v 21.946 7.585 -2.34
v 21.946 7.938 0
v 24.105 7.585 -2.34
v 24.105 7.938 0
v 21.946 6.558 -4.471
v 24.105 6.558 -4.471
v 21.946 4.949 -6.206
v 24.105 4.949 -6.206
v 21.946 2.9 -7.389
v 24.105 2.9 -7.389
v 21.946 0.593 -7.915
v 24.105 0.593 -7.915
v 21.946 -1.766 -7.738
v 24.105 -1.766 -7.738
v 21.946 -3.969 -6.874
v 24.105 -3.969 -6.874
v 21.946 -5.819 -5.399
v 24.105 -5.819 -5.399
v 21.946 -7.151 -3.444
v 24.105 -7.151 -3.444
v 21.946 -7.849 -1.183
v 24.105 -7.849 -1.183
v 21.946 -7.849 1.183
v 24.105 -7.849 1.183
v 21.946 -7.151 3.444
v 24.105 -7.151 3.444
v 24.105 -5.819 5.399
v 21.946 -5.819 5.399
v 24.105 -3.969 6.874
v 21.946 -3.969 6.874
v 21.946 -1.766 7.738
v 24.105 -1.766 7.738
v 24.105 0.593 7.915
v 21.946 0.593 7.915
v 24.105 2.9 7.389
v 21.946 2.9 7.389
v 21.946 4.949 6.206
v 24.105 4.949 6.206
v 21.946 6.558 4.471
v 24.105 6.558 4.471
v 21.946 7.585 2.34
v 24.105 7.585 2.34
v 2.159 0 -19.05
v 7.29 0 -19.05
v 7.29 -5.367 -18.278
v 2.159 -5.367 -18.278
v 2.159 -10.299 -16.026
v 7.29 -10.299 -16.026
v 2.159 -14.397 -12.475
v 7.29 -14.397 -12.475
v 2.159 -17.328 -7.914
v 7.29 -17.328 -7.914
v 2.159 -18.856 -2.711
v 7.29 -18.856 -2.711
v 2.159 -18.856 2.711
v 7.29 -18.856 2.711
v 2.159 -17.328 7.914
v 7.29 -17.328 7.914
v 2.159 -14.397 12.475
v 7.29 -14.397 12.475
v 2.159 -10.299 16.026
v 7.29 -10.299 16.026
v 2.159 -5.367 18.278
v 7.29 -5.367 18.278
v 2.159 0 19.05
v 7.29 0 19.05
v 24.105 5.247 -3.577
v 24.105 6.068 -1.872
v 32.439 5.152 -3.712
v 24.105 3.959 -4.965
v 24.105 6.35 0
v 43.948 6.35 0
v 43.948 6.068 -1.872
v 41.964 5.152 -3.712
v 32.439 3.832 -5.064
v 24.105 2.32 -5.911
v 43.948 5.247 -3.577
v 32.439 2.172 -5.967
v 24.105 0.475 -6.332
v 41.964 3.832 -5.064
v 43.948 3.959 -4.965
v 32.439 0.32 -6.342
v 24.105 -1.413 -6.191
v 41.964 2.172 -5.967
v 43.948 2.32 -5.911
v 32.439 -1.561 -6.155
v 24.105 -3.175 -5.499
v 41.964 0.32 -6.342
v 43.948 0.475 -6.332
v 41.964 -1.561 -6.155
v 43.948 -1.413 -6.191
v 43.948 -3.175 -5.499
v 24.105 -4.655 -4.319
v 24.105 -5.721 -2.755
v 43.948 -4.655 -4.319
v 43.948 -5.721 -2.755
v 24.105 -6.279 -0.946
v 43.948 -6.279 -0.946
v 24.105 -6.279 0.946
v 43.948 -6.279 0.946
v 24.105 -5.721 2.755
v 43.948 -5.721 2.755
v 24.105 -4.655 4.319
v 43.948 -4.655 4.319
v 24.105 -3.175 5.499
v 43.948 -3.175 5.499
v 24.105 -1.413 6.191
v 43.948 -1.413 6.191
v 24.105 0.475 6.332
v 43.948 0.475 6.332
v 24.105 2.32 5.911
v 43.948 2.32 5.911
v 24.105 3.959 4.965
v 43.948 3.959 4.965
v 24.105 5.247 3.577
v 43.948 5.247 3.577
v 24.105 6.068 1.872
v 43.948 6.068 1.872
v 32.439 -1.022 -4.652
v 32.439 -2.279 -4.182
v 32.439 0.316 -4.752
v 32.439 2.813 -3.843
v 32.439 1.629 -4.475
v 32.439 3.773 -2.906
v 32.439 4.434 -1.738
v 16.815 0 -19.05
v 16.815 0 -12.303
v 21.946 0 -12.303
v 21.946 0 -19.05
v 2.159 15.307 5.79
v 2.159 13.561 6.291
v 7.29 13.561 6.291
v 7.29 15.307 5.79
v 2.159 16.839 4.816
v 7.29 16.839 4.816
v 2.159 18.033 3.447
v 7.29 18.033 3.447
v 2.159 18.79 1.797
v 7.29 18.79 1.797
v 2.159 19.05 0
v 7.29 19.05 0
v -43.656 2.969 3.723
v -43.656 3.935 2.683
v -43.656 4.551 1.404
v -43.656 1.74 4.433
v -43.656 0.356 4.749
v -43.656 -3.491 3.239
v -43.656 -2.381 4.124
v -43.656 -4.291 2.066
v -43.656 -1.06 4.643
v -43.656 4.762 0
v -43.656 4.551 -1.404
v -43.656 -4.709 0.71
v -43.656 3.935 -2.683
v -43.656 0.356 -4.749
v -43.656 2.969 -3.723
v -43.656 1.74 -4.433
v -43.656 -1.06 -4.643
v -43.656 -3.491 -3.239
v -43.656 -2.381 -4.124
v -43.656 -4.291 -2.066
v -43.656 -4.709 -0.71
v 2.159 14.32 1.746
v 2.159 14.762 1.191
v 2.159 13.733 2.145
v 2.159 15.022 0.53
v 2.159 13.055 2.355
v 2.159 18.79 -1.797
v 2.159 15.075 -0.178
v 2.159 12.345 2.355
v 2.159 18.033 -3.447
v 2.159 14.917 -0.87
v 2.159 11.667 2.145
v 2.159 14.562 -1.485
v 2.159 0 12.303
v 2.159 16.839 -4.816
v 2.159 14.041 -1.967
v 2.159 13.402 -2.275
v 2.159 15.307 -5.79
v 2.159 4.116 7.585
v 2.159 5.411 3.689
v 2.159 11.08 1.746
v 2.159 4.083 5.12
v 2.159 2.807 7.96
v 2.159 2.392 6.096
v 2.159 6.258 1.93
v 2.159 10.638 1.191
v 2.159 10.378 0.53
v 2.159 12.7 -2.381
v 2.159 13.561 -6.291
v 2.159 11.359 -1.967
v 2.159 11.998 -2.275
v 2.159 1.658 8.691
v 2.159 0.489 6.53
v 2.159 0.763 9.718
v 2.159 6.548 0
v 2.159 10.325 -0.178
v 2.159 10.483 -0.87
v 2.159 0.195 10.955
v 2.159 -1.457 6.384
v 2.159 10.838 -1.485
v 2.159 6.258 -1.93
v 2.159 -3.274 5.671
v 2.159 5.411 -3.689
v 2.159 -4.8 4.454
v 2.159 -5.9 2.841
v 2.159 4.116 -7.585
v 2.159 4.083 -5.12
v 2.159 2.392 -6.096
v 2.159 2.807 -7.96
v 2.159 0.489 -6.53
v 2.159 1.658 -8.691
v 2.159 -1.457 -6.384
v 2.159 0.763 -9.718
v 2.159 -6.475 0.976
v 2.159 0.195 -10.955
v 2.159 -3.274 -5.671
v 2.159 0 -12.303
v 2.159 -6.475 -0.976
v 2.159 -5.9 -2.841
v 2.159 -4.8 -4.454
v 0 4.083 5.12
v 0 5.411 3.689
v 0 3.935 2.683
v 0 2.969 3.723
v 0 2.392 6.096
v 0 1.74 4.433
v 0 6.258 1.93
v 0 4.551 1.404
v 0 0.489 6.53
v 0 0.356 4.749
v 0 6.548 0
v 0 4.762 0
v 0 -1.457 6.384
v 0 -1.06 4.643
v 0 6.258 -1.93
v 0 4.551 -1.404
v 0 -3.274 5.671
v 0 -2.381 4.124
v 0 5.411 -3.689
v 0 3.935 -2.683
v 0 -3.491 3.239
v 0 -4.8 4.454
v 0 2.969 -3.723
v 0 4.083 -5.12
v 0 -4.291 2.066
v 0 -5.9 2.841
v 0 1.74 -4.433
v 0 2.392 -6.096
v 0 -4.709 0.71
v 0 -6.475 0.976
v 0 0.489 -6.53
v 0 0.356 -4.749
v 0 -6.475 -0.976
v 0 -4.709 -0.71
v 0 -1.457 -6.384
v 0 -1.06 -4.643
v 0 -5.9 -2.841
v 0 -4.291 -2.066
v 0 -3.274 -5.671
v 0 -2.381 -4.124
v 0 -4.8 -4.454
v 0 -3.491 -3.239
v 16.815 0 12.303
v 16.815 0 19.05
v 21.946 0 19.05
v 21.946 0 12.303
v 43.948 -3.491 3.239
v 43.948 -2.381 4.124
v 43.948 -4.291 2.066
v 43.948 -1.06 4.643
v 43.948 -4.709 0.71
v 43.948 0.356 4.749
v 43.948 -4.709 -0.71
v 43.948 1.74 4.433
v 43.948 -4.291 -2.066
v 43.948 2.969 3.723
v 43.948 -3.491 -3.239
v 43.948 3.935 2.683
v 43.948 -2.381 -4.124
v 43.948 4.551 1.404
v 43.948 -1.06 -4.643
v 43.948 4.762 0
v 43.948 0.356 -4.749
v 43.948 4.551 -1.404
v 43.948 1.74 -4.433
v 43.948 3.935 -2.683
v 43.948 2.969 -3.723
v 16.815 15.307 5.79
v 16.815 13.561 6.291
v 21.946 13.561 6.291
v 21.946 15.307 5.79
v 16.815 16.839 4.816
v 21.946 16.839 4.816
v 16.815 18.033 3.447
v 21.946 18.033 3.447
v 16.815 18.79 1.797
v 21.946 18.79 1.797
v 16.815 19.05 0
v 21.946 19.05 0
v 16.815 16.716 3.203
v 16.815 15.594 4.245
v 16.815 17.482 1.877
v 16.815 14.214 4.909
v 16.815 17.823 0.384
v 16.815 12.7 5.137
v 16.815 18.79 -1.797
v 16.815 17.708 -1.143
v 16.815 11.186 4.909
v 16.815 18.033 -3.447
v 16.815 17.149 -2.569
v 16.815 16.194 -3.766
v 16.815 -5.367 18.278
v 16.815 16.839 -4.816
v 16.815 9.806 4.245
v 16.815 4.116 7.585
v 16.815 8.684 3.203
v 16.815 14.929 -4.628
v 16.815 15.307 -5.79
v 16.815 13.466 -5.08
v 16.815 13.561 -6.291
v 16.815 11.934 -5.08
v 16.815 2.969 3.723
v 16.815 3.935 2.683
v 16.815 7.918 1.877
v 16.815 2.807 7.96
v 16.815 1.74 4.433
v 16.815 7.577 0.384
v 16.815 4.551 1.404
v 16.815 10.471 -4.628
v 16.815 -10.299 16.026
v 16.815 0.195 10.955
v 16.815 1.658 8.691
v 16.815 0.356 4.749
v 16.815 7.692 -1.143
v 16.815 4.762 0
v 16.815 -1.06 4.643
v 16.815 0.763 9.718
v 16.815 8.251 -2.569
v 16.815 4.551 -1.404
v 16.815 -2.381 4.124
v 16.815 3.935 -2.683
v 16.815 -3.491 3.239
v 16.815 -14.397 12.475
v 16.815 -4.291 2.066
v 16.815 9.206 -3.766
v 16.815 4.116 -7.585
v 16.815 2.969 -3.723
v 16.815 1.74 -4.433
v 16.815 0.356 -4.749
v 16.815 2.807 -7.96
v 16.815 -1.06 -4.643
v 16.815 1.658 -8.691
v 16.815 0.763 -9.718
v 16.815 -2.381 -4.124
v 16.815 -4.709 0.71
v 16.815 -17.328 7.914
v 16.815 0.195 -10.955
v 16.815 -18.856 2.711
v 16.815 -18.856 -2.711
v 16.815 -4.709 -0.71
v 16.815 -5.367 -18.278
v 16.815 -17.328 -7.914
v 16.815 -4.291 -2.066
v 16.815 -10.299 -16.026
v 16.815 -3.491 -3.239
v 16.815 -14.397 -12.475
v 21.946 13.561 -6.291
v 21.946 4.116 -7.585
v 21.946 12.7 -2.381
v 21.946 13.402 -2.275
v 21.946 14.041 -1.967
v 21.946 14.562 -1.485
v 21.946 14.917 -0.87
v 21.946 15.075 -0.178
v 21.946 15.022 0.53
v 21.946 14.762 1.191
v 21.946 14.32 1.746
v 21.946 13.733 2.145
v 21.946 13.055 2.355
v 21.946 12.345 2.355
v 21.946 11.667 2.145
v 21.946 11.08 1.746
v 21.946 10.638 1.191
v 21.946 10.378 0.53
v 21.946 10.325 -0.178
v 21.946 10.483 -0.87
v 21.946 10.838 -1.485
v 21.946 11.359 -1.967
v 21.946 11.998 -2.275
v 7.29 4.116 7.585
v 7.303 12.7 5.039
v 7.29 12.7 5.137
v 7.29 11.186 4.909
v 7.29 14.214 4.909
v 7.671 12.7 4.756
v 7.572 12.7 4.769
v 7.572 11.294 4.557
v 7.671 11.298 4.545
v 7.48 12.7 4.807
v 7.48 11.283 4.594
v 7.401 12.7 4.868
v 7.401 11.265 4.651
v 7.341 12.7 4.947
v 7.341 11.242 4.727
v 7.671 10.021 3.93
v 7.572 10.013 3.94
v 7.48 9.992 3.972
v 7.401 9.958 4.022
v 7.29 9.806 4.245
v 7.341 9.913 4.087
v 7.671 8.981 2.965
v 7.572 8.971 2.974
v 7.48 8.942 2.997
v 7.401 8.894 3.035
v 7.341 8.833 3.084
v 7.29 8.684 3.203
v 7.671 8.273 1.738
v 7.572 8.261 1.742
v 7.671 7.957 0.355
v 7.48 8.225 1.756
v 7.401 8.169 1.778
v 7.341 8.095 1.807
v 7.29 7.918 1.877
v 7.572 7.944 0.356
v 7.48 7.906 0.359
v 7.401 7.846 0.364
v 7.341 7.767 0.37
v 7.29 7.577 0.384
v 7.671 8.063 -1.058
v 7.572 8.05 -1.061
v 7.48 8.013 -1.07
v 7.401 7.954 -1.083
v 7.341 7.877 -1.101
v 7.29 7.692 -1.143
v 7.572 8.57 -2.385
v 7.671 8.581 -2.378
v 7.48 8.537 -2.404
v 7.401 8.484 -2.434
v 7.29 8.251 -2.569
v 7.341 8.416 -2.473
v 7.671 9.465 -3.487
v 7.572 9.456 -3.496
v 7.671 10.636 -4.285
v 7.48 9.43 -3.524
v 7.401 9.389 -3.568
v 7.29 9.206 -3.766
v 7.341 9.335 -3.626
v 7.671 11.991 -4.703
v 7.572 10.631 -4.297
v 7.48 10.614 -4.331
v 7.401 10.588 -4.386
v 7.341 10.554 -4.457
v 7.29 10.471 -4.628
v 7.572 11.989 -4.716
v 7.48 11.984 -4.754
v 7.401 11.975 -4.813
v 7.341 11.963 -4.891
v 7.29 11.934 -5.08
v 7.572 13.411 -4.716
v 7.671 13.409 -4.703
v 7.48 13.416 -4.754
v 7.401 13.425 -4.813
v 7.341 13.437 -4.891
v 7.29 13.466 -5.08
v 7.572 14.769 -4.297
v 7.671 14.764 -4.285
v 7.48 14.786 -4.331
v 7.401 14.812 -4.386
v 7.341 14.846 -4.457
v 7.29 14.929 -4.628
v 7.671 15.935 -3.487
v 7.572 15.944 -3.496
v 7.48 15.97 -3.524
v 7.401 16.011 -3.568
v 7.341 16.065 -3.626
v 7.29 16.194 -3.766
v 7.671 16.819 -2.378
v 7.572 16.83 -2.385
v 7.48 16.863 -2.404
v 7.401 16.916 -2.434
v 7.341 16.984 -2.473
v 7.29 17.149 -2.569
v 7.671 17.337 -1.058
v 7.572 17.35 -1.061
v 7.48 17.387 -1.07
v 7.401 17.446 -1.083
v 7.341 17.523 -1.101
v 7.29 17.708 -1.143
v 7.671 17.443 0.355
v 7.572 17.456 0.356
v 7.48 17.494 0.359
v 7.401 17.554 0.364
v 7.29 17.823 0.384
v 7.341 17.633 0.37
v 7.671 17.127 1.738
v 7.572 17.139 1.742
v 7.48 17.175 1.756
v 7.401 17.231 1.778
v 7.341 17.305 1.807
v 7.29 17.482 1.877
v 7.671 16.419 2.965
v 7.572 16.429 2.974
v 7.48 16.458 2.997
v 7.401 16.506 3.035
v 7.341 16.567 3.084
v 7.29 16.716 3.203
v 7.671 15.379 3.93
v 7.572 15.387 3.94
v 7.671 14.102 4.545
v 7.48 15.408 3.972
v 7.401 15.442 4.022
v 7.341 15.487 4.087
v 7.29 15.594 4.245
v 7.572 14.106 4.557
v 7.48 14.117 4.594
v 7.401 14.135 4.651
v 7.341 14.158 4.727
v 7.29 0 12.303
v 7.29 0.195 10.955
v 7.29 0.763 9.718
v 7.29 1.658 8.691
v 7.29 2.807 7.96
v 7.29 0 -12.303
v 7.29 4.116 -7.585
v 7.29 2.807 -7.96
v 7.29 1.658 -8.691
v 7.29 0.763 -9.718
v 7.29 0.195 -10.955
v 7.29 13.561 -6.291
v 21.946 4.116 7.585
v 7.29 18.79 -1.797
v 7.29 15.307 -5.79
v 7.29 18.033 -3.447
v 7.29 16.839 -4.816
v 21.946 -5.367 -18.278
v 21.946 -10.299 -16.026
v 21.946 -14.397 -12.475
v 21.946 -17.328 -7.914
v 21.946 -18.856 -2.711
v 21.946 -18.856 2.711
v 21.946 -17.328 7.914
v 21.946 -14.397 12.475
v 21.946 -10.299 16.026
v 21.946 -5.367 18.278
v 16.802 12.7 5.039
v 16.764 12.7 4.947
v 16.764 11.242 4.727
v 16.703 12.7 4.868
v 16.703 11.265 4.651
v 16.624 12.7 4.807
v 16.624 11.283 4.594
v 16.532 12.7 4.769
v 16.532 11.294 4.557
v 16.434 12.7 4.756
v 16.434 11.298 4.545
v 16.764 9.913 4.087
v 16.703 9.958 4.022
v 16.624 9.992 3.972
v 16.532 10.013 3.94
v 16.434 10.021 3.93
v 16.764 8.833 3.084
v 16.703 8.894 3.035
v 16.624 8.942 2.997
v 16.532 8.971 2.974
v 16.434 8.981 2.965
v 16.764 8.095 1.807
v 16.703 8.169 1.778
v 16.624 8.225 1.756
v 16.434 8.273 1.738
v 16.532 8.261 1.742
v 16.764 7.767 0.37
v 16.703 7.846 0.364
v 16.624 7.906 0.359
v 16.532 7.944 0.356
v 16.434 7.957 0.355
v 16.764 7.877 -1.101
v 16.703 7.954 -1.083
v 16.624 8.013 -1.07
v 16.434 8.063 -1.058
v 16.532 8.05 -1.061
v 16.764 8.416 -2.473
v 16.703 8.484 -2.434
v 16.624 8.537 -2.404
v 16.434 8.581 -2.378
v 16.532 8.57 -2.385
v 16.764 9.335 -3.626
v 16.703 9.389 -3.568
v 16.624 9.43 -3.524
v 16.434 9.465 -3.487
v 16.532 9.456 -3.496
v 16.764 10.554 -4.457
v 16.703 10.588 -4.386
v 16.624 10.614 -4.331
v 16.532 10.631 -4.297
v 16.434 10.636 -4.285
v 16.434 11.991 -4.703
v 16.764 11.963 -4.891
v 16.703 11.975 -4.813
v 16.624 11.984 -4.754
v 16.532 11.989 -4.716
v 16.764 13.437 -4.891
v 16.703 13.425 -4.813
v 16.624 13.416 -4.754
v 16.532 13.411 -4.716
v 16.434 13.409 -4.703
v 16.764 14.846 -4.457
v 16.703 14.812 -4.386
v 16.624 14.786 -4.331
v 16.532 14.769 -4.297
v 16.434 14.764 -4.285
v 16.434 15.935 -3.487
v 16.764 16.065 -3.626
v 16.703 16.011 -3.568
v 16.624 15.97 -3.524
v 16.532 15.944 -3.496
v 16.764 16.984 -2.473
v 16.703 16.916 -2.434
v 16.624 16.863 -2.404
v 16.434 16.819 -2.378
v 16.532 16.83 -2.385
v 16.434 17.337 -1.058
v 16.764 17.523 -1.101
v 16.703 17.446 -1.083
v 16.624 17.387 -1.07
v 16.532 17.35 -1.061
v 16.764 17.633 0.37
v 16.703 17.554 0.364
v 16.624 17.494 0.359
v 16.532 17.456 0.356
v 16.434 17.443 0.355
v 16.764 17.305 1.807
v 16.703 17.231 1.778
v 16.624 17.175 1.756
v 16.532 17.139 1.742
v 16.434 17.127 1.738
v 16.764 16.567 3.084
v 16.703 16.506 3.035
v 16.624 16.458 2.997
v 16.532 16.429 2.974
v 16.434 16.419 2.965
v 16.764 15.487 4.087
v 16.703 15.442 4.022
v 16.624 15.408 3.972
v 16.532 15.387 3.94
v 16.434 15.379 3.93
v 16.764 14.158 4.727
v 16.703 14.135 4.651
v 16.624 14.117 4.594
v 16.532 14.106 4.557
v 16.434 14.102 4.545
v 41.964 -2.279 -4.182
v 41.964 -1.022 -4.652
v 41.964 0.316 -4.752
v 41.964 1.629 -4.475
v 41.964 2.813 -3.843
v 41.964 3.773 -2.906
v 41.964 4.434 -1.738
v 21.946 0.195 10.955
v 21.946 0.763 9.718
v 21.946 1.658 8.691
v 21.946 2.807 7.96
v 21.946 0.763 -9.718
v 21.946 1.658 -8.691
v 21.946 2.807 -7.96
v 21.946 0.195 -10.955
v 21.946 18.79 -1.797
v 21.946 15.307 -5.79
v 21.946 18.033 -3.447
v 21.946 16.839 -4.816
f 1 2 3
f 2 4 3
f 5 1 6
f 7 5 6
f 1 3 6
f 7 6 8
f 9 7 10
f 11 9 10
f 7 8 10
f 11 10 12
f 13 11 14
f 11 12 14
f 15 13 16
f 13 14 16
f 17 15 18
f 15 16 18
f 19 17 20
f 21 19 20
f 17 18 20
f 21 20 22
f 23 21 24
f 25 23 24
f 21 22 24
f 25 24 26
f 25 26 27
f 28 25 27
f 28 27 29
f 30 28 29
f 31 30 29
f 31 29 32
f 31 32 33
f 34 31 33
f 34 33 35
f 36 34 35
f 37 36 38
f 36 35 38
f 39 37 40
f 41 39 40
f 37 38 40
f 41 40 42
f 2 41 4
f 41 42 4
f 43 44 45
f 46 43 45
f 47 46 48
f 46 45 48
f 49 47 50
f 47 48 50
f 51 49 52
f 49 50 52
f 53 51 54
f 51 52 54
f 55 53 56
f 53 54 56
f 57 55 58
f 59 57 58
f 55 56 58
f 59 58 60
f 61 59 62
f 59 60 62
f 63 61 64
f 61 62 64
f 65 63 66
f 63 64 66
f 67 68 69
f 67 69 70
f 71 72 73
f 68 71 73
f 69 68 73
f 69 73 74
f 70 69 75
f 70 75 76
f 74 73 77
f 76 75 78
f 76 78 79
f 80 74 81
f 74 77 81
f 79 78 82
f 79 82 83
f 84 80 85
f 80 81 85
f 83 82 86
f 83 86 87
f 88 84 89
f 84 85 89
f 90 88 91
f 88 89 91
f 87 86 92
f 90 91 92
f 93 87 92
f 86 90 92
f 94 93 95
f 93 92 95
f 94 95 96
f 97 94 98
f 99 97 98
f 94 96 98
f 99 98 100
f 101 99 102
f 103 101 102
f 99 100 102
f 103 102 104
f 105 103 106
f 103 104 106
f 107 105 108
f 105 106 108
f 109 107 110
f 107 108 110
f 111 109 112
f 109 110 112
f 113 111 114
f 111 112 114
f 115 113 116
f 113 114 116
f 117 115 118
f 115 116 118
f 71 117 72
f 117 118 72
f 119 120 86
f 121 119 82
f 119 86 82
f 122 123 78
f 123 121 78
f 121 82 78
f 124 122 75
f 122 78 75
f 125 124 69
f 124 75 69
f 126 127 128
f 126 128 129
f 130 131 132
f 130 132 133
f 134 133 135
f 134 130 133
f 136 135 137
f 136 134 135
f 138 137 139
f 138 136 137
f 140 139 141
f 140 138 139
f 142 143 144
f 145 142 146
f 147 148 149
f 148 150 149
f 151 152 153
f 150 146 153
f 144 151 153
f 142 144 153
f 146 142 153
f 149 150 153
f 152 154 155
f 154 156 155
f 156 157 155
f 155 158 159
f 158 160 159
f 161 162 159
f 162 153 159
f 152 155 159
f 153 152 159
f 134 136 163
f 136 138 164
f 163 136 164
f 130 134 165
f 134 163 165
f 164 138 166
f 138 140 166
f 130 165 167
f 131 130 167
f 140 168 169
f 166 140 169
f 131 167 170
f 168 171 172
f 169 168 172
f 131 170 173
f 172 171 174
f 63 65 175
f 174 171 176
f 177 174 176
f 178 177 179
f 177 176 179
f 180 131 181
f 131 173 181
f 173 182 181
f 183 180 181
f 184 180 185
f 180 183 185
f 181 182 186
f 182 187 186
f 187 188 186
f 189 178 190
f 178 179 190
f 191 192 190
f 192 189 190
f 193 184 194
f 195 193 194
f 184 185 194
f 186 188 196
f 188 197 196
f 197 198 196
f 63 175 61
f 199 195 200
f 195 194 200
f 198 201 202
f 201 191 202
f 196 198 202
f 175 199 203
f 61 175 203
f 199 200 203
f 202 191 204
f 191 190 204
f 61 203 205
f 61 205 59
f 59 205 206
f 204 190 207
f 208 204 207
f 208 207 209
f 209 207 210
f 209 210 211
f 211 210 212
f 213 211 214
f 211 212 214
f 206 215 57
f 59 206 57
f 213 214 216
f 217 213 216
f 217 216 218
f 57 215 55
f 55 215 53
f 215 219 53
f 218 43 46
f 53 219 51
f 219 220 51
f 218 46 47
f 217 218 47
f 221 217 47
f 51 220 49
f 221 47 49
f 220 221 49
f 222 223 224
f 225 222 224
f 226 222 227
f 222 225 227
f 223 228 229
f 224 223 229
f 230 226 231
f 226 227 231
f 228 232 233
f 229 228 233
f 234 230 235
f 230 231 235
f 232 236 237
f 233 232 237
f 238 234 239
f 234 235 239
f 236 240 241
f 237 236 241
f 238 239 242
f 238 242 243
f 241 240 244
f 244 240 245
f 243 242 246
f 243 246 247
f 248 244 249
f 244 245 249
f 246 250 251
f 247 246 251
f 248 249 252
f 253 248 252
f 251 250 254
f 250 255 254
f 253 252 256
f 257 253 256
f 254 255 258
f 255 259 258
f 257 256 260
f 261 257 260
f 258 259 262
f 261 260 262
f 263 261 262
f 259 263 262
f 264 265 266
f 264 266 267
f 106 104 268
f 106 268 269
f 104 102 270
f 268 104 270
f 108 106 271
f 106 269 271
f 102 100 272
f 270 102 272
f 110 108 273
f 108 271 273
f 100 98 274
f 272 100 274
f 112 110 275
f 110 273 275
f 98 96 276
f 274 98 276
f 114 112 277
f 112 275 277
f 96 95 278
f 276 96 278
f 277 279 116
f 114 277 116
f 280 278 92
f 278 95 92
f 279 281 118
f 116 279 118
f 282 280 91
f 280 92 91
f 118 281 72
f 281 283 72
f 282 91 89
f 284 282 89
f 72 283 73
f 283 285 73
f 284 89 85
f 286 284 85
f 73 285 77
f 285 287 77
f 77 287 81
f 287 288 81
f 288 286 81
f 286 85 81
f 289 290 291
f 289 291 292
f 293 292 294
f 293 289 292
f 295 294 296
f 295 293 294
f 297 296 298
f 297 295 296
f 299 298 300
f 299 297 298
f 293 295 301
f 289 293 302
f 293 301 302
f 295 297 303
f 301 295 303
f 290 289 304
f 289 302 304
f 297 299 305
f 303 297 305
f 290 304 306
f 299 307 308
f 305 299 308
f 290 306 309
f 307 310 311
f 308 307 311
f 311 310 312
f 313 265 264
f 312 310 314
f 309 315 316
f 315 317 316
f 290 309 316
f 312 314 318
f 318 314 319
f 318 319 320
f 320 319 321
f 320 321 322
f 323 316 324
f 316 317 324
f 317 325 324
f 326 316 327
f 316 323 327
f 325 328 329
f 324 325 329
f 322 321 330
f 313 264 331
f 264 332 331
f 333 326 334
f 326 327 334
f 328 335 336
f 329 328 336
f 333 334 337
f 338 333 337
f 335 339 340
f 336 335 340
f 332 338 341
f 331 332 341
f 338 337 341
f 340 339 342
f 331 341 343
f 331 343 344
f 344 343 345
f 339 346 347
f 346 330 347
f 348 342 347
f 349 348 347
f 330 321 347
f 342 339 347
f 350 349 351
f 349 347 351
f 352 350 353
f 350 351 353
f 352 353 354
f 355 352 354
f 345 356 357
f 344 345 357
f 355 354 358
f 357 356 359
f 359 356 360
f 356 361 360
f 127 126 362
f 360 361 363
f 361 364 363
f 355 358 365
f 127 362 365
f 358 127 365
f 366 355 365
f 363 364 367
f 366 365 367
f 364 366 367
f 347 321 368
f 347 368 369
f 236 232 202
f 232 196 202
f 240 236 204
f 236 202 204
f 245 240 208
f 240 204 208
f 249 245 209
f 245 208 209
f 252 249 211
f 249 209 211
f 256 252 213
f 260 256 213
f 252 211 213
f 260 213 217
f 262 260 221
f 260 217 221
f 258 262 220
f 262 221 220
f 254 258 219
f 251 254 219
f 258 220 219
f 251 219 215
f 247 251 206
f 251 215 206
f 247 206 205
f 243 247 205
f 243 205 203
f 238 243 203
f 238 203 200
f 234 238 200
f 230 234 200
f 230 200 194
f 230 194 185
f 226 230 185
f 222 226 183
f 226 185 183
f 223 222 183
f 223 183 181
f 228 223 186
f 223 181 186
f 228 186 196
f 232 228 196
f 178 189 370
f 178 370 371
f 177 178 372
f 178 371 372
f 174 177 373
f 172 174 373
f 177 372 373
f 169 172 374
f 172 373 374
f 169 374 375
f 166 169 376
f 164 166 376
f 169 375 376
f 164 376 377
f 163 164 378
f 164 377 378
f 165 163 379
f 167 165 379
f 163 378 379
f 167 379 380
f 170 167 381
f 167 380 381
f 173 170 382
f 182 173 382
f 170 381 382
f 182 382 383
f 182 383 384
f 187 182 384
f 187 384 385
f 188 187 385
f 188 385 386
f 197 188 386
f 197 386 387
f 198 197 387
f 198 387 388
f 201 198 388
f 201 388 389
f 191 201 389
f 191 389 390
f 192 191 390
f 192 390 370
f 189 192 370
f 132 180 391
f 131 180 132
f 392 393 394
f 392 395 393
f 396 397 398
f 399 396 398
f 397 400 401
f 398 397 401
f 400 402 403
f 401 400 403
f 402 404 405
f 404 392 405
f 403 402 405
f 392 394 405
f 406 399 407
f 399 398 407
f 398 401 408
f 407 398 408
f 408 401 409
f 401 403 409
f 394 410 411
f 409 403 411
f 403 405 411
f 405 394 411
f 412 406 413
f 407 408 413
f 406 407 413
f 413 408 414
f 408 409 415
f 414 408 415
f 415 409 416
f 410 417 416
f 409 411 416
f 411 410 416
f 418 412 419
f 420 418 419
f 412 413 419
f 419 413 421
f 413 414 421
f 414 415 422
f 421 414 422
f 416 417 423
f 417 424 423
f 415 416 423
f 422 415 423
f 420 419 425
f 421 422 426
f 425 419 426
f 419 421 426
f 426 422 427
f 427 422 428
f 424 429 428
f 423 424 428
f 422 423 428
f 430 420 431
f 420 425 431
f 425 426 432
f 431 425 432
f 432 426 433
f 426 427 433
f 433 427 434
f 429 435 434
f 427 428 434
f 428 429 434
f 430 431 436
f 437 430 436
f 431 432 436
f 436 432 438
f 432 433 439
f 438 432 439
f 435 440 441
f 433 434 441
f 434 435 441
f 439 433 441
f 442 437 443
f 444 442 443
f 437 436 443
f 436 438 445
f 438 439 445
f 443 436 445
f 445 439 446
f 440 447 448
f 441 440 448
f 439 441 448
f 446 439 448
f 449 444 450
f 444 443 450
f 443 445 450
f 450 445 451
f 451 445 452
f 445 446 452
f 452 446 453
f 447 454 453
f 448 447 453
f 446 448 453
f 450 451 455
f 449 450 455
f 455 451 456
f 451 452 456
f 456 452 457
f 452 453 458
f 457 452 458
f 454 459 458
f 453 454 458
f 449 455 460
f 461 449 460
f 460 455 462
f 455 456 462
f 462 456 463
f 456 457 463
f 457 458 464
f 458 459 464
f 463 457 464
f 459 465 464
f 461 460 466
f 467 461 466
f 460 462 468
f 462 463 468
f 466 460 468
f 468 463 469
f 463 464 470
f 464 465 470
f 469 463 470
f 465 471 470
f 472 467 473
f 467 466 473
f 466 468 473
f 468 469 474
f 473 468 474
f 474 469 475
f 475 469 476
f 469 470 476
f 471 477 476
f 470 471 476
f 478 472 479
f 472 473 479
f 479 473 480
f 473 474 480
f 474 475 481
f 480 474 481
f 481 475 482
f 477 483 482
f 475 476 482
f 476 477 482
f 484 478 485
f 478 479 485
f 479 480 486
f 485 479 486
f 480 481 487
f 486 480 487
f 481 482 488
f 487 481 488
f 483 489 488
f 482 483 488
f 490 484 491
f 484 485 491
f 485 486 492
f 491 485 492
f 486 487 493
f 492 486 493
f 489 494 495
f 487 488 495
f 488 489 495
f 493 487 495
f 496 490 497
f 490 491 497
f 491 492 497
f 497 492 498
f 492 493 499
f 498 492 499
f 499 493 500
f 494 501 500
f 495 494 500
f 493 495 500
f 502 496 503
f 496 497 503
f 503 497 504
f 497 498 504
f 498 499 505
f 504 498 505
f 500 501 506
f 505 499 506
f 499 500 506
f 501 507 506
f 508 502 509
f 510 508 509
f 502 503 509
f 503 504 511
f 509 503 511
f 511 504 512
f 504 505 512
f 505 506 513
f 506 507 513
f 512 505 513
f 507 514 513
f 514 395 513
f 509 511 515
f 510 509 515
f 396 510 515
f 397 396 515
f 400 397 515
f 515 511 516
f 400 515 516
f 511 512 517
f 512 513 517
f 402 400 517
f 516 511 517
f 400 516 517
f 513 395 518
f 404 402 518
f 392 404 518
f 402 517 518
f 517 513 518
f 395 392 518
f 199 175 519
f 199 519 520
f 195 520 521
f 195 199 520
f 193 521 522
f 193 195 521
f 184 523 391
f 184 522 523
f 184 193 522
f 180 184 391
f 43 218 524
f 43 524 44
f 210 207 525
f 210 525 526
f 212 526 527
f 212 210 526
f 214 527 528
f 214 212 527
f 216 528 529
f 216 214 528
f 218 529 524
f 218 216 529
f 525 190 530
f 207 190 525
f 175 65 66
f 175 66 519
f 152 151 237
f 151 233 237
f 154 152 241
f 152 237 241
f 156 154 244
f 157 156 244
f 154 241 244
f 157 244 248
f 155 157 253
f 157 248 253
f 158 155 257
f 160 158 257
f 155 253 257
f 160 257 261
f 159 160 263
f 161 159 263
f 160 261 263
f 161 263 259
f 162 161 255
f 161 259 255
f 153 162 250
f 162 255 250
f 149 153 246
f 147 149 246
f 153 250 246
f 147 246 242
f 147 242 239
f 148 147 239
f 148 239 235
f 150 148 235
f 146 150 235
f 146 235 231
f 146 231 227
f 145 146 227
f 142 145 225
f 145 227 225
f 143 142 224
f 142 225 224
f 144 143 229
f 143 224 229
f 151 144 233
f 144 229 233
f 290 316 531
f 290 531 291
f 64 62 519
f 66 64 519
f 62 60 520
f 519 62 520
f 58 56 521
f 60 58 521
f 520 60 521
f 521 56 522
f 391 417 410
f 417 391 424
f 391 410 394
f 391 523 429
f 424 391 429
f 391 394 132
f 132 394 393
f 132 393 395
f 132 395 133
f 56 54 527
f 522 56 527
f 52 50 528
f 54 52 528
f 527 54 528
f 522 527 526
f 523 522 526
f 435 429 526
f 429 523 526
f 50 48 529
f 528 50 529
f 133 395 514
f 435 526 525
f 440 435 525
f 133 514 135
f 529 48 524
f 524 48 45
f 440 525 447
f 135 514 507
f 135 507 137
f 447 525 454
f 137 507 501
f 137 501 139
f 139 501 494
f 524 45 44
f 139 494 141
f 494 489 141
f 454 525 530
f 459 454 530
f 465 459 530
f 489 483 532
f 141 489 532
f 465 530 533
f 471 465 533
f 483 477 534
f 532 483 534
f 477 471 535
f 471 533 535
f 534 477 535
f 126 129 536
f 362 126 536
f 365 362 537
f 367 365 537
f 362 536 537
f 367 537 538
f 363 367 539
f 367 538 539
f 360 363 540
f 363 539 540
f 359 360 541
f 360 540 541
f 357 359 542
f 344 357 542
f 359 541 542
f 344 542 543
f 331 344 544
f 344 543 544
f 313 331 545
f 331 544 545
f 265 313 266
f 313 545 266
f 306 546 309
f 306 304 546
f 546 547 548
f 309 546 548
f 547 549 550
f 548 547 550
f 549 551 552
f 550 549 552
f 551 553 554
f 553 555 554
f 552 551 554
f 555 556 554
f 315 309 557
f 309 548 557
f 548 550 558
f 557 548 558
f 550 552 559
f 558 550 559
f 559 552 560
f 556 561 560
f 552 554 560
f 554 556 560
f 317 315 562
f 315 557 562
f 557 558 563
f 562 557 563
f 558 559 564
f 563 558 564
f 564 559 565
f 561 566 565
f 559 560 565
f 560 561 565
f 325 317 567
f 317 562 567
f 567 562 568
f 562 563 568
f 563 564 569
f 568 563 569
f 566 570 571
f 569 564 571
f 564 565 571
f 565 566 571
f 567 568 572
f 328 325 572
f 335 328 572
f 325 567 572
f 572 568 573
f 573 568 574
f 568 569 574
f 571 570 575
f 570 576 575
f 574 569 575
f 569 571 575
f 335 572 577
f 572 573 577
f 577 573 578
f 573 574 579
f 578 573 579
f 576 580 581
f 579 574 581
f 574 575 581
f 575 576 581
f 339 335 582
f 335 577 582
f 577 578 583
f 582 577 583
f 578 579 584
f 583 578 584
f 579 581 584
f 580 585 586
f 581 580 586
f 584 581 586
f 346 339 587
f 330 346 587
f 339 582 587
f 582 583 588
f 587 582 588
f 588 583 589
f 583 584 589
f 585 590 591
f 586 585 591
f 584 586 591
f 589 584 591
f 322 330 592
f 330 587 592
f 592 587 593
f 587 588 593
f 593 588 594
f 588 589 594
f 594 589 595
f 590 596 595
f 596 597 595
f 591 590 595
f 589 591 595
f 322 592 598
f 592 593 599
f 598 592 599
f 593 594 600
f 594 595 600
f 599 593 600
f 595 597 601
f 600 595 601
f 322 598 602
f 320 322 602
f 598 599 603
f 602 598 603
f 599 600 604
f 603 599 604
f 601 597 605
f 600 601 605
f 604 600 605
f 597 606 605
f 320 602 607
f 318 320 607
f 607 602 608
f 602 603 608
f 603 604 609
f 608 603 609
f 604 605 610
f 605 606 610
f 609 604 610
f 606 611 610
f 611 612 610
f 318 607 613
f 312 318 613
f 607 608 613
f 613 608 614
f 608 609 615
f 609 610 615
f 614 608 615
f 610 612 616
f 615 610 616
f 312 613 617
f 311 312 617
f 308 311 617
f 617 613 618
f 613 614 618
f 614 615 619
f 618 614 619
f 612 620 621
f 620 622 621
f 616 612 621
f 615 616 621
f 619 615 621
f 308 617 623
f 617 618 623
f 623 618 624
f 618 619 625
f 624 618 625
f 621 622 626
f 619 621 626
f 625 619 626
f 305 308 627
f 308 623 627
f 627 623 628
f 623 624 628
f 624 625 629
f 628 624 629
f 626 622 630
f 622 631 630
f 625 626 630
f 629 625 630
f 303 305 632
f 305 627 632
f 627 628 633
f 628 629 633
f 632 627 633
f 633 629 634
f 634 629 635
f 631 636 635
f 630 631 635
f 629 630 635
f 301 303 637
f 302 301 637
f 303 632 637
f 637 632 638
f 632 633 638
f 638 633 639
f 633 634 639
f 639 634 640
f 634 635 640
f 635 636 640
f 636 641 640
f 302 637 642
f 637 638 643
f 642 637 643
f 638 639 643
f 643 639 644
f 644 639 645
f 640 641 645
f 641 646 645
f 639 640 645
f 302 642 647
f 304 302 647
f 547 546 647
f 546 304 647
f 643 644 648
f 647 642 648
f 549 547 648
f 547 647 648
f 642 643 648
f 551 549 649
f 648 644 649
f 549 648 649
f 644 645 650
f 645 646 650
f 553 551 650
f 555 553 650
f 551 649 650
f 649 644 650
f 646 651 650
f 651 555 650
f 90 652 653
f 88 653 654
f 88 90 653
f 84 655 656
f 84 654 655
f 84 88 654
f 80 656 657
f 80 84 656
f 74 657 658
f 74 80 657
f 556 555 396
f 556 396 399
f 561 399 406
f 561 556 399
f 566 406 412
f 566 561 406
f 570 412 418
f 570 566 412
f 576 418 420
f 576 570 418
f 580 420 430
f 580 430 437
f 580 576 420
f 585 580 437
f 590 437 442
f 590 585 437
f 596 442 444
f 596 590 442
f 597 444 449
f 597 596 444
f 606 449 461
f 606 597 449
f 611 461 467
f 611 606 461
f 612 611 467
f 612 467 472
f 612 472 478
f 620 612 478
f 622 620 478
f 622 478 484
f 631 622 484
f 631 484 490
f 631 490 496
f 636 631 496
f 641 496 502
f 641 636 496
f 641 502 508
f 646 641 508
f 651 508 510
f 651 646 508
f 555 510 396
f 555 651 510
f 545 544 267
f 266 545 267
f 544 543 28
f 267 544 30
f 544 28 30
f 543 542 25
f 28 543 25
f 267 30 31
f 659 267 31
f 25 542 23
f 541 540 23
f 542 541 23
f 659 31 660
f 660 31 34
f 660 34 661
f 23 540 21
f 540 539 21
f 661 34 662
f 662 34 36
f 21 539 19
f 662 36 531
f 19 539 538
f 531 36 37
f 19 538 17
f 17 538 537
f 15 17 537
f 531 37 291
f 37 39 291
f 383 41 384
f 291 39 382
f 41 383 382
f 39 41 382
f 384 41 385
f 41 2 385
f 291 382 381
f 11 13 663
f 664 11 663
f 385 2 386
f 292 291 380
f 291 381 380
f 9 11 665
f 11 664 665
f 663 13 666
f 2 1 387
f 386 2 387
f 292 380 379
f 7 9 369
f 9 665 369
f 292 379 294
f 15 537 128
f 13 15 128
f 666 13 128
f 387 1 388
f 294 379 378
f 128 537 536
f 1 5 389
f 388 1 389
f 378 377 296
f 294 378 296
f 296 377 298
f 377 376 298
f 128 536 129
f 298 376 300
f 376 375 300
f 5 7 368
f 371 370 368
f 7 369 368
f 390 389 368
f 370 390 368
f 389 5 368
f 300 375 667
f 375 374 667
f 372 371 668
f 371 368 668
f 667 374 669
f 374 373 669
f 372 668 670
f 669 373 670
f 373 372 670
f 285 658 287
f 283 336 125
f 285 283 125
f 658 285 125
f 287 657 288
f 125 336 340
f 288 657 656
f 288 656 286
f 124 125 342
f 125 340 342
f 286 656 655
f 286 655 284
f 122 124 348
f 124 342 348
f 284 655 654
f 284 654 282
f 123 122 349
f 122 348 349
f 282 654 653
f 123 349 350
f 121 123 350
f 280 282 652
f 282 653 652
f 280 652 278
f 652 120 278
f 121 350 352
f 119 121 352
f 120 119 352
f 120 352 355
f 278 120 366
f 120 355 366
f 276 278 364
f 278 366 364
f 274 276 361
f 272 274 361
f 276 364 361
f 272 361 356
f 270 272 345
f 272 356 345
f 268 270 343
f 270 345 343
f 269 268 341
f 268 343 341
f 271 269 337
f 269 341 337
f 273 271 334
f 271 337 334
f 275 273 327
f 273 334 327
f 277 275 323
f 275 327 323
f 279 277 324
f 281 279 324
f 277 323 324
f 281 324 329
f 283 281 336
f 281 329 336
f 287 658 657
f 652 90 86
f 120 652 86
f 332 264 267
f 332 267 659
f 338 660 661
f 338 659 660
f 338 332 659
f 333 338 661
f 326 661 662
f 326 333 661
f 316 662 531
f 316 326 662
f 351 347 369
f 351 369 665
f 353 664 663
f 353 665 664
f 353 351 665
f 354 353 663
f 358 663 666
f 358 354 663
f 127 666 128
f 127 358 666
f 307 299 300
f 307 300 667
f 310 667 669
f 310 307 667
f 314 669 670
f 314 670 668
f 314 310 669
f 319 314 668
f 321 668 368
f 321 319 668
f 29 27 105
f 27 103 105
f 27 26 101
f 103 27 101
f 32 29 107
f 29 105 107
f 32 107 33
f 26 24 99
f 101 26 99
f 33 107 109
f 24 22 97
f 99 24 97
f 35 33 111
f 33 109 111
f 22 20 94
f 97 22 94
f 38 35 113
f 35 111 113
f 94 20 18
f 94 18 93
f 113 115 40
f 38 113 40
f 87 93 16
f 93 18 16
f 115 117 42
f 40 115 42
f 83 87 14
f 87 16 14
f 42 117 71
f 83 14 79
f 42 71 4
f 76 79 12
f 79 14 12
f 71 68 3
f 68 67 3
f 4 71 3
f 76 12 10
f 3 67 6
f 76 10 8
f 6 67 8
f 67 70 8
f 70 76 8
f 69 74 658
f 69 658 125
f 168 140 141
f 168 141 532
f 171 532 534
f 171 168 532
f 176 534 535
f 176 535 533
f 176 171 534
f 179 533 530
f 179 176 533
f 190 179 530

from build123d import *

# Parameters (mm, degrees)
SKETCH2_W                      = 9.525
SKETCH2_H                      = 4.75615
CUT_EXTRUDE1_REACH             = 69.93
SKETCH4_W                      = 9.525
SKETCH4_H                      = 7.14375
CUT_EXTRUDE1_DIRECTION_2_DEPTH = 68.929971613
FILLET1_R                      = 0.381
CUT_EXTRUDE2_DEPTH             = 71.918317263
CUT_EXTRUDE2_DEPTH_BACK        = 71.918317263
F_3_16_0_1875_DIAMETER_HOLE1_D = 4.7625


with BuildPart() as part:
    # Sketch1 → Revolve1 (revolve)
    with BuildSketch(Plane.XY):
        Polygon((-43.65625, 0), (-43.65625, 4.7625), (0, 4.7625), (0, 6.5484375), (2.159, 6.5484375), (2.159, 19.05), (7.2898, 19.05), (7.2898, 0), align=None)
        Polygon((16.8148, 4.7625), (16.8148, 19.05), (21.9456, 19.05), (21.9456, 7.9375), (24.1046, 7.9375), (24.1046, 6.35), (43.94835, 6.35), (43.94835, 4.7625), align=None)
    revolve(axis=Axis((0, 0, 0), (-1, 0, 0)))

    # Sketch2 → Revolve2 (revolve)
    with BuildSketch(Plane.XY, mode=Mode.PRIVATE) as revolve2_sk:
        with Locations((12.0523, 15.078075)):
            Rectangle(SKETCH2_W, SKETCH2_H)
    revolve(revolve2_sk.sketch.rotate(Axis((-15.553486907, 12.7, 0), (1, 0, 0)), 90), axis=Axis((-15.553486907, 12.7, 0), (1, 0, 0)))

    # Sketch4 → Cut-Extrude1 (cut, up to next)
    with BuildSketch(Plane(origin=(7.2898, 6.51548373, -17.901144426), x_dir=(-1, 0, 0), z_dir=(0, 0.34202014332566627, -0.9396926207859093)), mode=Mode.PRIVATE) as cut_extrude1_sk1:
        with Locations((-29.911675, 0)):
            Rectangle(SKETCH4_W, SKETCH4_H)
    cut_extrude1_tool1 = extrude(cut_extrude1_sk1.sketch, amount=-CUT_EXTRUDE1_REACH, mode=Mode.PRIVATE) & part.part
    add(cut_extrude1_tool1.solids().sort_by_distance((37.201475, 6.515484, -17.901144))[0], mode=Mode.SUBTRACT)

    # Sketch4 → Cut-Extrude1 direction 2 (cut)
    with BuildSketch(Plane(origin=(7.2898, 6.51548373, -17.901144426), x_dir=(-1, 0, 0), z_dir=(0, 0.34202014332566627, -0.9396926207859093))):
        with Locations((-29.911675, 0)):
            Rectangle(SKETCH4_W, SKETCH4_H)
    extrude(amount=CUT_EXTRUDE1_DIRECTION_2_DEPTH, mode=Mode.SUBTRACT)

    # Fillet1
    fillet1_edges = [part.edges().sort_by_distance(p)[0] for p in [
        (7.2898, 12.7, -4.75615),
        (16.8148, 12.7, -4.75615),
    ]]
    fillet(fillet1_edges, radius=FILLET1_R)

    # Sketch5 → Cut-Extrude2 (cut, two sides: drawn at the far end of the back side and taken through both)
    with BuildSketch(Plane(origin=(21.9456, 0, 0), x_dir=(0, 0, -1), z_dir=(1, 0, 0)).offset(-CUT_EXTRUDE2_DEPTH_BACK)):
        with BuildLine():
            ThreePointArc((-6.291289262, 13.561498357), (-4.174445198, 17.485029497), (2e-09, 19.05))
            ThreePointArc((2e-09, 19.05), (-13.470384181, 13.470384182), (-19.05, 0))
            Line((-19.05, 0), (-12.303125, 0))
            ThreePointArc((-12.303125, 0), (-9.172291101, 1.173727878), (-7.584658053, 4.116376233))
            Line((-7.584658053, 4.116376233), (-6.291289262, 13.561498357))
        make_face()
        with BuildLine():
            ThreePointArc((7.584658053, 4.116376233), (9.172291101, 1.173727878), (12.303125, 0))
            Line((12.303125, 0), (19.05, 0))
            ThreePointArc((19.05, 0), (13.470384182, 13.470384181), (2e-09, 19.05))
            ThreePointArc((2e-09, 19.05), (4.1744452, 17.485029496), (6.291289262, 13.561498357))
            Line((6.291289262, 13.561498357), (7.584658053, 4.116376233))
        make_face()
    extrude(amount=CUT_EXTRUDE2_DEPTH + CUT_EXTRUDE2_DEPTH_BACK, mode=Mode.SUBTRACT)

    # 3/16 (0.1875) Diameter Hole1 (through all)
    with Locations(Plane.ZY.offset(-2.159)):
        with Locations((0, 12.7)):
            Hole(F_3_16_0_1875_DIAMETER_HOLE1_D / 2)


solid = part.part
